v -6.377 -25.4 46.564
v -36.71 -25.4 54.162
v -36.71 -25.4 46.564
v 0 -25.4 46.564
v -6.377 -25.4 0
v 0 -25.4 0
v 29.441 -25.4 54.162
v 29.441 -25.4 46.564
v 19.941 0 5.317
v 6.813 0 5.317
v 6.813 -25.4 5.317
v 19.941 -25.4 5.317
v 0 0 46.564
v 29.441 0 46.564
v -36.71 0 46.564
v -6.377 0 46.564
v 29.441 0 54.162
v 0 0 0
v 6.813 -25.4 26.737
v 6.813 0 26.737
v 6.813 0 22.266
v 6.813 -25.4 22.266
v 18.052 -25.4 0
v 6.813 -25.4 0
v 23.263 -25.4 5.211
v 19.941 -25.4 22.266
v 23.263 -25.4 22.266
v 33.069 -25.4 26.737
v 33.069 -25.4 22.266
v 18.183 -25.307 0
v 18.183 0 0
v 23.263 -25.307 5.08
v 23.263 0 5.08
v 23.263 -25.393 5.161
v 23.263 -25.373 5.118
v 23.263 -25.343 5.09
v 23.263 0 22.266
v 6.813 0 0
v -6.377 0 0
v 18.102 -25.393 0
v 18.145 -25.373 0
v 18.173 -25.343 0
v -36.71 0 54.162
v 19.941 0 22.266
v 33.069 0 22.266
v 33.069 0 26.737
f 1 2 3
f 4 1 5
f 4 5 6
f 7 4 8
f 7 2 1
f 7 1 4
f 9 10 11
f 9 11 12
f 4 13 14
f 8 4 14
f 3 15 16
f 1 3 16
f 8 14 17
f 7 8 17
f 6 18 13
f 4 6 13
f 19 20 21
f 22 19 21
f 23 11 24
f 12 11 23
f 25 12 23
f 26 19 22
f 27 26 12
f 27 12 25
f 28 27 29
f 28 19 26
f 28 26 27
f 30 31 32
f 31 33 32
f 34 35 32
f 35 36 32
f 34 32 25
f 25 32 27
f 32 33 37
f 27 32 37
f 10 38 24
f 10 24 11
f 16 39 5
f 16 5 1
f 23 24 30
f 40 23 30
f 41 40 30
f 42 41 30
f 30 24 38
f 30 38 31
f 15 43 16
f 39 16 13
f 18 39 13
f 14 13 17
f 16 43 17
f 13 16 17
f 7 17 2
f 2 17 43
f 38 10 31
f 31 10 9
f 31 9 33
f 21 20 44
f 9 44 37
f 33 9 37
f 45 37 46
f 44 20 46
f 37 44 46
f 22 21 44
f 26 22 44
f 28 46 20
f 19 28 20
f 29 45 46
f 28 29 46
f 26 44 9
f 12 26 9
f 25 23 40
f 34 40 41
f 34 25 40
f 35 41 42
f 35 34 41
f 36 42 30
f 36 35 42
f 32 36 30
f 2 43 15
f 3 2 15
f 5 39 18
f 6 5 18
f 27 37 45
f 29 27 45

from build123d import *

# Parameters (mm, degrees)
F1_DEPTH = 25.4
F0_W     = 6.3766241074
F0_H     = 46.5644598007
F2_DEPTH = 25.4
F3_W     = 13.1279472262
F3_H     = 5.3173005581
F4_DEPTH = 25.4
F5_SIZE  = 5.08
F6_R     = 0.0926991994


with BuildPart() as f1:
    # F0 (on Front) → F1 (new body)
    with BuildSketch(Plane.XZ):
        Polygon((29.4410213828, 54.1621446609), (-36.7096215487, 54.1621446609), (-36.7096215487, 46.5644598007), (-6.3766241074, 46.5644598007), (0, 46.5644598007), (29.4410213828, 46.5644598007), align=None)
    extrude(amount=F1_DEPTH)

    # F0 (on Front) → F2 (join)
    with BuildSketch(Plane.XZ):
        with Locations((-3.1883120537, 23.2822299004)):
            Rectangle(F0_W, F0_H)
    extrude(amount=F2_DEPTH)


with BuildPart() as f4:
    # F3 (on Front) → F4 (new body)
    with BuildSketch(Plane.XZ):
        Polygon((33.0686308444, 26.7372559756), (6.812736392, 26.7372559756), (6.812736392, 22.2660899162), (19.9406836182, 22.2660899162), (23.2630521059, 22.2660899162), (33.0686308444, 22.2660899162), align=None)
        Polygon((23.2630521059, 22.2660899162), (19.9406836182, 22.2660899162), (19.9406836182, 5.3173005581), (19.9406836182, 0), (23.2630521059, 0), align=None)
        with Locations((13.3767100051, 2.658650279)):
            Rectangle(F3_W, F3_H)
    extrude(amount=F4_DEPTH)

    # F5
    f5_edges = [f4.edges().sort_by_distance(p)[0] for p in [
        (23.263052, -12.7, 0),
    ]]
    chamfer(f5_edges, length=F5_SIZE)

    # F6
    f6_edges = [f4.edges().sort_by_distance(p)[0] for p in [
        (20.723052, -25.4, 2.54),
    ]]
    fillet(f6_edges, radius=F6_R)


solid = Compound([f1.part, f4.part])
